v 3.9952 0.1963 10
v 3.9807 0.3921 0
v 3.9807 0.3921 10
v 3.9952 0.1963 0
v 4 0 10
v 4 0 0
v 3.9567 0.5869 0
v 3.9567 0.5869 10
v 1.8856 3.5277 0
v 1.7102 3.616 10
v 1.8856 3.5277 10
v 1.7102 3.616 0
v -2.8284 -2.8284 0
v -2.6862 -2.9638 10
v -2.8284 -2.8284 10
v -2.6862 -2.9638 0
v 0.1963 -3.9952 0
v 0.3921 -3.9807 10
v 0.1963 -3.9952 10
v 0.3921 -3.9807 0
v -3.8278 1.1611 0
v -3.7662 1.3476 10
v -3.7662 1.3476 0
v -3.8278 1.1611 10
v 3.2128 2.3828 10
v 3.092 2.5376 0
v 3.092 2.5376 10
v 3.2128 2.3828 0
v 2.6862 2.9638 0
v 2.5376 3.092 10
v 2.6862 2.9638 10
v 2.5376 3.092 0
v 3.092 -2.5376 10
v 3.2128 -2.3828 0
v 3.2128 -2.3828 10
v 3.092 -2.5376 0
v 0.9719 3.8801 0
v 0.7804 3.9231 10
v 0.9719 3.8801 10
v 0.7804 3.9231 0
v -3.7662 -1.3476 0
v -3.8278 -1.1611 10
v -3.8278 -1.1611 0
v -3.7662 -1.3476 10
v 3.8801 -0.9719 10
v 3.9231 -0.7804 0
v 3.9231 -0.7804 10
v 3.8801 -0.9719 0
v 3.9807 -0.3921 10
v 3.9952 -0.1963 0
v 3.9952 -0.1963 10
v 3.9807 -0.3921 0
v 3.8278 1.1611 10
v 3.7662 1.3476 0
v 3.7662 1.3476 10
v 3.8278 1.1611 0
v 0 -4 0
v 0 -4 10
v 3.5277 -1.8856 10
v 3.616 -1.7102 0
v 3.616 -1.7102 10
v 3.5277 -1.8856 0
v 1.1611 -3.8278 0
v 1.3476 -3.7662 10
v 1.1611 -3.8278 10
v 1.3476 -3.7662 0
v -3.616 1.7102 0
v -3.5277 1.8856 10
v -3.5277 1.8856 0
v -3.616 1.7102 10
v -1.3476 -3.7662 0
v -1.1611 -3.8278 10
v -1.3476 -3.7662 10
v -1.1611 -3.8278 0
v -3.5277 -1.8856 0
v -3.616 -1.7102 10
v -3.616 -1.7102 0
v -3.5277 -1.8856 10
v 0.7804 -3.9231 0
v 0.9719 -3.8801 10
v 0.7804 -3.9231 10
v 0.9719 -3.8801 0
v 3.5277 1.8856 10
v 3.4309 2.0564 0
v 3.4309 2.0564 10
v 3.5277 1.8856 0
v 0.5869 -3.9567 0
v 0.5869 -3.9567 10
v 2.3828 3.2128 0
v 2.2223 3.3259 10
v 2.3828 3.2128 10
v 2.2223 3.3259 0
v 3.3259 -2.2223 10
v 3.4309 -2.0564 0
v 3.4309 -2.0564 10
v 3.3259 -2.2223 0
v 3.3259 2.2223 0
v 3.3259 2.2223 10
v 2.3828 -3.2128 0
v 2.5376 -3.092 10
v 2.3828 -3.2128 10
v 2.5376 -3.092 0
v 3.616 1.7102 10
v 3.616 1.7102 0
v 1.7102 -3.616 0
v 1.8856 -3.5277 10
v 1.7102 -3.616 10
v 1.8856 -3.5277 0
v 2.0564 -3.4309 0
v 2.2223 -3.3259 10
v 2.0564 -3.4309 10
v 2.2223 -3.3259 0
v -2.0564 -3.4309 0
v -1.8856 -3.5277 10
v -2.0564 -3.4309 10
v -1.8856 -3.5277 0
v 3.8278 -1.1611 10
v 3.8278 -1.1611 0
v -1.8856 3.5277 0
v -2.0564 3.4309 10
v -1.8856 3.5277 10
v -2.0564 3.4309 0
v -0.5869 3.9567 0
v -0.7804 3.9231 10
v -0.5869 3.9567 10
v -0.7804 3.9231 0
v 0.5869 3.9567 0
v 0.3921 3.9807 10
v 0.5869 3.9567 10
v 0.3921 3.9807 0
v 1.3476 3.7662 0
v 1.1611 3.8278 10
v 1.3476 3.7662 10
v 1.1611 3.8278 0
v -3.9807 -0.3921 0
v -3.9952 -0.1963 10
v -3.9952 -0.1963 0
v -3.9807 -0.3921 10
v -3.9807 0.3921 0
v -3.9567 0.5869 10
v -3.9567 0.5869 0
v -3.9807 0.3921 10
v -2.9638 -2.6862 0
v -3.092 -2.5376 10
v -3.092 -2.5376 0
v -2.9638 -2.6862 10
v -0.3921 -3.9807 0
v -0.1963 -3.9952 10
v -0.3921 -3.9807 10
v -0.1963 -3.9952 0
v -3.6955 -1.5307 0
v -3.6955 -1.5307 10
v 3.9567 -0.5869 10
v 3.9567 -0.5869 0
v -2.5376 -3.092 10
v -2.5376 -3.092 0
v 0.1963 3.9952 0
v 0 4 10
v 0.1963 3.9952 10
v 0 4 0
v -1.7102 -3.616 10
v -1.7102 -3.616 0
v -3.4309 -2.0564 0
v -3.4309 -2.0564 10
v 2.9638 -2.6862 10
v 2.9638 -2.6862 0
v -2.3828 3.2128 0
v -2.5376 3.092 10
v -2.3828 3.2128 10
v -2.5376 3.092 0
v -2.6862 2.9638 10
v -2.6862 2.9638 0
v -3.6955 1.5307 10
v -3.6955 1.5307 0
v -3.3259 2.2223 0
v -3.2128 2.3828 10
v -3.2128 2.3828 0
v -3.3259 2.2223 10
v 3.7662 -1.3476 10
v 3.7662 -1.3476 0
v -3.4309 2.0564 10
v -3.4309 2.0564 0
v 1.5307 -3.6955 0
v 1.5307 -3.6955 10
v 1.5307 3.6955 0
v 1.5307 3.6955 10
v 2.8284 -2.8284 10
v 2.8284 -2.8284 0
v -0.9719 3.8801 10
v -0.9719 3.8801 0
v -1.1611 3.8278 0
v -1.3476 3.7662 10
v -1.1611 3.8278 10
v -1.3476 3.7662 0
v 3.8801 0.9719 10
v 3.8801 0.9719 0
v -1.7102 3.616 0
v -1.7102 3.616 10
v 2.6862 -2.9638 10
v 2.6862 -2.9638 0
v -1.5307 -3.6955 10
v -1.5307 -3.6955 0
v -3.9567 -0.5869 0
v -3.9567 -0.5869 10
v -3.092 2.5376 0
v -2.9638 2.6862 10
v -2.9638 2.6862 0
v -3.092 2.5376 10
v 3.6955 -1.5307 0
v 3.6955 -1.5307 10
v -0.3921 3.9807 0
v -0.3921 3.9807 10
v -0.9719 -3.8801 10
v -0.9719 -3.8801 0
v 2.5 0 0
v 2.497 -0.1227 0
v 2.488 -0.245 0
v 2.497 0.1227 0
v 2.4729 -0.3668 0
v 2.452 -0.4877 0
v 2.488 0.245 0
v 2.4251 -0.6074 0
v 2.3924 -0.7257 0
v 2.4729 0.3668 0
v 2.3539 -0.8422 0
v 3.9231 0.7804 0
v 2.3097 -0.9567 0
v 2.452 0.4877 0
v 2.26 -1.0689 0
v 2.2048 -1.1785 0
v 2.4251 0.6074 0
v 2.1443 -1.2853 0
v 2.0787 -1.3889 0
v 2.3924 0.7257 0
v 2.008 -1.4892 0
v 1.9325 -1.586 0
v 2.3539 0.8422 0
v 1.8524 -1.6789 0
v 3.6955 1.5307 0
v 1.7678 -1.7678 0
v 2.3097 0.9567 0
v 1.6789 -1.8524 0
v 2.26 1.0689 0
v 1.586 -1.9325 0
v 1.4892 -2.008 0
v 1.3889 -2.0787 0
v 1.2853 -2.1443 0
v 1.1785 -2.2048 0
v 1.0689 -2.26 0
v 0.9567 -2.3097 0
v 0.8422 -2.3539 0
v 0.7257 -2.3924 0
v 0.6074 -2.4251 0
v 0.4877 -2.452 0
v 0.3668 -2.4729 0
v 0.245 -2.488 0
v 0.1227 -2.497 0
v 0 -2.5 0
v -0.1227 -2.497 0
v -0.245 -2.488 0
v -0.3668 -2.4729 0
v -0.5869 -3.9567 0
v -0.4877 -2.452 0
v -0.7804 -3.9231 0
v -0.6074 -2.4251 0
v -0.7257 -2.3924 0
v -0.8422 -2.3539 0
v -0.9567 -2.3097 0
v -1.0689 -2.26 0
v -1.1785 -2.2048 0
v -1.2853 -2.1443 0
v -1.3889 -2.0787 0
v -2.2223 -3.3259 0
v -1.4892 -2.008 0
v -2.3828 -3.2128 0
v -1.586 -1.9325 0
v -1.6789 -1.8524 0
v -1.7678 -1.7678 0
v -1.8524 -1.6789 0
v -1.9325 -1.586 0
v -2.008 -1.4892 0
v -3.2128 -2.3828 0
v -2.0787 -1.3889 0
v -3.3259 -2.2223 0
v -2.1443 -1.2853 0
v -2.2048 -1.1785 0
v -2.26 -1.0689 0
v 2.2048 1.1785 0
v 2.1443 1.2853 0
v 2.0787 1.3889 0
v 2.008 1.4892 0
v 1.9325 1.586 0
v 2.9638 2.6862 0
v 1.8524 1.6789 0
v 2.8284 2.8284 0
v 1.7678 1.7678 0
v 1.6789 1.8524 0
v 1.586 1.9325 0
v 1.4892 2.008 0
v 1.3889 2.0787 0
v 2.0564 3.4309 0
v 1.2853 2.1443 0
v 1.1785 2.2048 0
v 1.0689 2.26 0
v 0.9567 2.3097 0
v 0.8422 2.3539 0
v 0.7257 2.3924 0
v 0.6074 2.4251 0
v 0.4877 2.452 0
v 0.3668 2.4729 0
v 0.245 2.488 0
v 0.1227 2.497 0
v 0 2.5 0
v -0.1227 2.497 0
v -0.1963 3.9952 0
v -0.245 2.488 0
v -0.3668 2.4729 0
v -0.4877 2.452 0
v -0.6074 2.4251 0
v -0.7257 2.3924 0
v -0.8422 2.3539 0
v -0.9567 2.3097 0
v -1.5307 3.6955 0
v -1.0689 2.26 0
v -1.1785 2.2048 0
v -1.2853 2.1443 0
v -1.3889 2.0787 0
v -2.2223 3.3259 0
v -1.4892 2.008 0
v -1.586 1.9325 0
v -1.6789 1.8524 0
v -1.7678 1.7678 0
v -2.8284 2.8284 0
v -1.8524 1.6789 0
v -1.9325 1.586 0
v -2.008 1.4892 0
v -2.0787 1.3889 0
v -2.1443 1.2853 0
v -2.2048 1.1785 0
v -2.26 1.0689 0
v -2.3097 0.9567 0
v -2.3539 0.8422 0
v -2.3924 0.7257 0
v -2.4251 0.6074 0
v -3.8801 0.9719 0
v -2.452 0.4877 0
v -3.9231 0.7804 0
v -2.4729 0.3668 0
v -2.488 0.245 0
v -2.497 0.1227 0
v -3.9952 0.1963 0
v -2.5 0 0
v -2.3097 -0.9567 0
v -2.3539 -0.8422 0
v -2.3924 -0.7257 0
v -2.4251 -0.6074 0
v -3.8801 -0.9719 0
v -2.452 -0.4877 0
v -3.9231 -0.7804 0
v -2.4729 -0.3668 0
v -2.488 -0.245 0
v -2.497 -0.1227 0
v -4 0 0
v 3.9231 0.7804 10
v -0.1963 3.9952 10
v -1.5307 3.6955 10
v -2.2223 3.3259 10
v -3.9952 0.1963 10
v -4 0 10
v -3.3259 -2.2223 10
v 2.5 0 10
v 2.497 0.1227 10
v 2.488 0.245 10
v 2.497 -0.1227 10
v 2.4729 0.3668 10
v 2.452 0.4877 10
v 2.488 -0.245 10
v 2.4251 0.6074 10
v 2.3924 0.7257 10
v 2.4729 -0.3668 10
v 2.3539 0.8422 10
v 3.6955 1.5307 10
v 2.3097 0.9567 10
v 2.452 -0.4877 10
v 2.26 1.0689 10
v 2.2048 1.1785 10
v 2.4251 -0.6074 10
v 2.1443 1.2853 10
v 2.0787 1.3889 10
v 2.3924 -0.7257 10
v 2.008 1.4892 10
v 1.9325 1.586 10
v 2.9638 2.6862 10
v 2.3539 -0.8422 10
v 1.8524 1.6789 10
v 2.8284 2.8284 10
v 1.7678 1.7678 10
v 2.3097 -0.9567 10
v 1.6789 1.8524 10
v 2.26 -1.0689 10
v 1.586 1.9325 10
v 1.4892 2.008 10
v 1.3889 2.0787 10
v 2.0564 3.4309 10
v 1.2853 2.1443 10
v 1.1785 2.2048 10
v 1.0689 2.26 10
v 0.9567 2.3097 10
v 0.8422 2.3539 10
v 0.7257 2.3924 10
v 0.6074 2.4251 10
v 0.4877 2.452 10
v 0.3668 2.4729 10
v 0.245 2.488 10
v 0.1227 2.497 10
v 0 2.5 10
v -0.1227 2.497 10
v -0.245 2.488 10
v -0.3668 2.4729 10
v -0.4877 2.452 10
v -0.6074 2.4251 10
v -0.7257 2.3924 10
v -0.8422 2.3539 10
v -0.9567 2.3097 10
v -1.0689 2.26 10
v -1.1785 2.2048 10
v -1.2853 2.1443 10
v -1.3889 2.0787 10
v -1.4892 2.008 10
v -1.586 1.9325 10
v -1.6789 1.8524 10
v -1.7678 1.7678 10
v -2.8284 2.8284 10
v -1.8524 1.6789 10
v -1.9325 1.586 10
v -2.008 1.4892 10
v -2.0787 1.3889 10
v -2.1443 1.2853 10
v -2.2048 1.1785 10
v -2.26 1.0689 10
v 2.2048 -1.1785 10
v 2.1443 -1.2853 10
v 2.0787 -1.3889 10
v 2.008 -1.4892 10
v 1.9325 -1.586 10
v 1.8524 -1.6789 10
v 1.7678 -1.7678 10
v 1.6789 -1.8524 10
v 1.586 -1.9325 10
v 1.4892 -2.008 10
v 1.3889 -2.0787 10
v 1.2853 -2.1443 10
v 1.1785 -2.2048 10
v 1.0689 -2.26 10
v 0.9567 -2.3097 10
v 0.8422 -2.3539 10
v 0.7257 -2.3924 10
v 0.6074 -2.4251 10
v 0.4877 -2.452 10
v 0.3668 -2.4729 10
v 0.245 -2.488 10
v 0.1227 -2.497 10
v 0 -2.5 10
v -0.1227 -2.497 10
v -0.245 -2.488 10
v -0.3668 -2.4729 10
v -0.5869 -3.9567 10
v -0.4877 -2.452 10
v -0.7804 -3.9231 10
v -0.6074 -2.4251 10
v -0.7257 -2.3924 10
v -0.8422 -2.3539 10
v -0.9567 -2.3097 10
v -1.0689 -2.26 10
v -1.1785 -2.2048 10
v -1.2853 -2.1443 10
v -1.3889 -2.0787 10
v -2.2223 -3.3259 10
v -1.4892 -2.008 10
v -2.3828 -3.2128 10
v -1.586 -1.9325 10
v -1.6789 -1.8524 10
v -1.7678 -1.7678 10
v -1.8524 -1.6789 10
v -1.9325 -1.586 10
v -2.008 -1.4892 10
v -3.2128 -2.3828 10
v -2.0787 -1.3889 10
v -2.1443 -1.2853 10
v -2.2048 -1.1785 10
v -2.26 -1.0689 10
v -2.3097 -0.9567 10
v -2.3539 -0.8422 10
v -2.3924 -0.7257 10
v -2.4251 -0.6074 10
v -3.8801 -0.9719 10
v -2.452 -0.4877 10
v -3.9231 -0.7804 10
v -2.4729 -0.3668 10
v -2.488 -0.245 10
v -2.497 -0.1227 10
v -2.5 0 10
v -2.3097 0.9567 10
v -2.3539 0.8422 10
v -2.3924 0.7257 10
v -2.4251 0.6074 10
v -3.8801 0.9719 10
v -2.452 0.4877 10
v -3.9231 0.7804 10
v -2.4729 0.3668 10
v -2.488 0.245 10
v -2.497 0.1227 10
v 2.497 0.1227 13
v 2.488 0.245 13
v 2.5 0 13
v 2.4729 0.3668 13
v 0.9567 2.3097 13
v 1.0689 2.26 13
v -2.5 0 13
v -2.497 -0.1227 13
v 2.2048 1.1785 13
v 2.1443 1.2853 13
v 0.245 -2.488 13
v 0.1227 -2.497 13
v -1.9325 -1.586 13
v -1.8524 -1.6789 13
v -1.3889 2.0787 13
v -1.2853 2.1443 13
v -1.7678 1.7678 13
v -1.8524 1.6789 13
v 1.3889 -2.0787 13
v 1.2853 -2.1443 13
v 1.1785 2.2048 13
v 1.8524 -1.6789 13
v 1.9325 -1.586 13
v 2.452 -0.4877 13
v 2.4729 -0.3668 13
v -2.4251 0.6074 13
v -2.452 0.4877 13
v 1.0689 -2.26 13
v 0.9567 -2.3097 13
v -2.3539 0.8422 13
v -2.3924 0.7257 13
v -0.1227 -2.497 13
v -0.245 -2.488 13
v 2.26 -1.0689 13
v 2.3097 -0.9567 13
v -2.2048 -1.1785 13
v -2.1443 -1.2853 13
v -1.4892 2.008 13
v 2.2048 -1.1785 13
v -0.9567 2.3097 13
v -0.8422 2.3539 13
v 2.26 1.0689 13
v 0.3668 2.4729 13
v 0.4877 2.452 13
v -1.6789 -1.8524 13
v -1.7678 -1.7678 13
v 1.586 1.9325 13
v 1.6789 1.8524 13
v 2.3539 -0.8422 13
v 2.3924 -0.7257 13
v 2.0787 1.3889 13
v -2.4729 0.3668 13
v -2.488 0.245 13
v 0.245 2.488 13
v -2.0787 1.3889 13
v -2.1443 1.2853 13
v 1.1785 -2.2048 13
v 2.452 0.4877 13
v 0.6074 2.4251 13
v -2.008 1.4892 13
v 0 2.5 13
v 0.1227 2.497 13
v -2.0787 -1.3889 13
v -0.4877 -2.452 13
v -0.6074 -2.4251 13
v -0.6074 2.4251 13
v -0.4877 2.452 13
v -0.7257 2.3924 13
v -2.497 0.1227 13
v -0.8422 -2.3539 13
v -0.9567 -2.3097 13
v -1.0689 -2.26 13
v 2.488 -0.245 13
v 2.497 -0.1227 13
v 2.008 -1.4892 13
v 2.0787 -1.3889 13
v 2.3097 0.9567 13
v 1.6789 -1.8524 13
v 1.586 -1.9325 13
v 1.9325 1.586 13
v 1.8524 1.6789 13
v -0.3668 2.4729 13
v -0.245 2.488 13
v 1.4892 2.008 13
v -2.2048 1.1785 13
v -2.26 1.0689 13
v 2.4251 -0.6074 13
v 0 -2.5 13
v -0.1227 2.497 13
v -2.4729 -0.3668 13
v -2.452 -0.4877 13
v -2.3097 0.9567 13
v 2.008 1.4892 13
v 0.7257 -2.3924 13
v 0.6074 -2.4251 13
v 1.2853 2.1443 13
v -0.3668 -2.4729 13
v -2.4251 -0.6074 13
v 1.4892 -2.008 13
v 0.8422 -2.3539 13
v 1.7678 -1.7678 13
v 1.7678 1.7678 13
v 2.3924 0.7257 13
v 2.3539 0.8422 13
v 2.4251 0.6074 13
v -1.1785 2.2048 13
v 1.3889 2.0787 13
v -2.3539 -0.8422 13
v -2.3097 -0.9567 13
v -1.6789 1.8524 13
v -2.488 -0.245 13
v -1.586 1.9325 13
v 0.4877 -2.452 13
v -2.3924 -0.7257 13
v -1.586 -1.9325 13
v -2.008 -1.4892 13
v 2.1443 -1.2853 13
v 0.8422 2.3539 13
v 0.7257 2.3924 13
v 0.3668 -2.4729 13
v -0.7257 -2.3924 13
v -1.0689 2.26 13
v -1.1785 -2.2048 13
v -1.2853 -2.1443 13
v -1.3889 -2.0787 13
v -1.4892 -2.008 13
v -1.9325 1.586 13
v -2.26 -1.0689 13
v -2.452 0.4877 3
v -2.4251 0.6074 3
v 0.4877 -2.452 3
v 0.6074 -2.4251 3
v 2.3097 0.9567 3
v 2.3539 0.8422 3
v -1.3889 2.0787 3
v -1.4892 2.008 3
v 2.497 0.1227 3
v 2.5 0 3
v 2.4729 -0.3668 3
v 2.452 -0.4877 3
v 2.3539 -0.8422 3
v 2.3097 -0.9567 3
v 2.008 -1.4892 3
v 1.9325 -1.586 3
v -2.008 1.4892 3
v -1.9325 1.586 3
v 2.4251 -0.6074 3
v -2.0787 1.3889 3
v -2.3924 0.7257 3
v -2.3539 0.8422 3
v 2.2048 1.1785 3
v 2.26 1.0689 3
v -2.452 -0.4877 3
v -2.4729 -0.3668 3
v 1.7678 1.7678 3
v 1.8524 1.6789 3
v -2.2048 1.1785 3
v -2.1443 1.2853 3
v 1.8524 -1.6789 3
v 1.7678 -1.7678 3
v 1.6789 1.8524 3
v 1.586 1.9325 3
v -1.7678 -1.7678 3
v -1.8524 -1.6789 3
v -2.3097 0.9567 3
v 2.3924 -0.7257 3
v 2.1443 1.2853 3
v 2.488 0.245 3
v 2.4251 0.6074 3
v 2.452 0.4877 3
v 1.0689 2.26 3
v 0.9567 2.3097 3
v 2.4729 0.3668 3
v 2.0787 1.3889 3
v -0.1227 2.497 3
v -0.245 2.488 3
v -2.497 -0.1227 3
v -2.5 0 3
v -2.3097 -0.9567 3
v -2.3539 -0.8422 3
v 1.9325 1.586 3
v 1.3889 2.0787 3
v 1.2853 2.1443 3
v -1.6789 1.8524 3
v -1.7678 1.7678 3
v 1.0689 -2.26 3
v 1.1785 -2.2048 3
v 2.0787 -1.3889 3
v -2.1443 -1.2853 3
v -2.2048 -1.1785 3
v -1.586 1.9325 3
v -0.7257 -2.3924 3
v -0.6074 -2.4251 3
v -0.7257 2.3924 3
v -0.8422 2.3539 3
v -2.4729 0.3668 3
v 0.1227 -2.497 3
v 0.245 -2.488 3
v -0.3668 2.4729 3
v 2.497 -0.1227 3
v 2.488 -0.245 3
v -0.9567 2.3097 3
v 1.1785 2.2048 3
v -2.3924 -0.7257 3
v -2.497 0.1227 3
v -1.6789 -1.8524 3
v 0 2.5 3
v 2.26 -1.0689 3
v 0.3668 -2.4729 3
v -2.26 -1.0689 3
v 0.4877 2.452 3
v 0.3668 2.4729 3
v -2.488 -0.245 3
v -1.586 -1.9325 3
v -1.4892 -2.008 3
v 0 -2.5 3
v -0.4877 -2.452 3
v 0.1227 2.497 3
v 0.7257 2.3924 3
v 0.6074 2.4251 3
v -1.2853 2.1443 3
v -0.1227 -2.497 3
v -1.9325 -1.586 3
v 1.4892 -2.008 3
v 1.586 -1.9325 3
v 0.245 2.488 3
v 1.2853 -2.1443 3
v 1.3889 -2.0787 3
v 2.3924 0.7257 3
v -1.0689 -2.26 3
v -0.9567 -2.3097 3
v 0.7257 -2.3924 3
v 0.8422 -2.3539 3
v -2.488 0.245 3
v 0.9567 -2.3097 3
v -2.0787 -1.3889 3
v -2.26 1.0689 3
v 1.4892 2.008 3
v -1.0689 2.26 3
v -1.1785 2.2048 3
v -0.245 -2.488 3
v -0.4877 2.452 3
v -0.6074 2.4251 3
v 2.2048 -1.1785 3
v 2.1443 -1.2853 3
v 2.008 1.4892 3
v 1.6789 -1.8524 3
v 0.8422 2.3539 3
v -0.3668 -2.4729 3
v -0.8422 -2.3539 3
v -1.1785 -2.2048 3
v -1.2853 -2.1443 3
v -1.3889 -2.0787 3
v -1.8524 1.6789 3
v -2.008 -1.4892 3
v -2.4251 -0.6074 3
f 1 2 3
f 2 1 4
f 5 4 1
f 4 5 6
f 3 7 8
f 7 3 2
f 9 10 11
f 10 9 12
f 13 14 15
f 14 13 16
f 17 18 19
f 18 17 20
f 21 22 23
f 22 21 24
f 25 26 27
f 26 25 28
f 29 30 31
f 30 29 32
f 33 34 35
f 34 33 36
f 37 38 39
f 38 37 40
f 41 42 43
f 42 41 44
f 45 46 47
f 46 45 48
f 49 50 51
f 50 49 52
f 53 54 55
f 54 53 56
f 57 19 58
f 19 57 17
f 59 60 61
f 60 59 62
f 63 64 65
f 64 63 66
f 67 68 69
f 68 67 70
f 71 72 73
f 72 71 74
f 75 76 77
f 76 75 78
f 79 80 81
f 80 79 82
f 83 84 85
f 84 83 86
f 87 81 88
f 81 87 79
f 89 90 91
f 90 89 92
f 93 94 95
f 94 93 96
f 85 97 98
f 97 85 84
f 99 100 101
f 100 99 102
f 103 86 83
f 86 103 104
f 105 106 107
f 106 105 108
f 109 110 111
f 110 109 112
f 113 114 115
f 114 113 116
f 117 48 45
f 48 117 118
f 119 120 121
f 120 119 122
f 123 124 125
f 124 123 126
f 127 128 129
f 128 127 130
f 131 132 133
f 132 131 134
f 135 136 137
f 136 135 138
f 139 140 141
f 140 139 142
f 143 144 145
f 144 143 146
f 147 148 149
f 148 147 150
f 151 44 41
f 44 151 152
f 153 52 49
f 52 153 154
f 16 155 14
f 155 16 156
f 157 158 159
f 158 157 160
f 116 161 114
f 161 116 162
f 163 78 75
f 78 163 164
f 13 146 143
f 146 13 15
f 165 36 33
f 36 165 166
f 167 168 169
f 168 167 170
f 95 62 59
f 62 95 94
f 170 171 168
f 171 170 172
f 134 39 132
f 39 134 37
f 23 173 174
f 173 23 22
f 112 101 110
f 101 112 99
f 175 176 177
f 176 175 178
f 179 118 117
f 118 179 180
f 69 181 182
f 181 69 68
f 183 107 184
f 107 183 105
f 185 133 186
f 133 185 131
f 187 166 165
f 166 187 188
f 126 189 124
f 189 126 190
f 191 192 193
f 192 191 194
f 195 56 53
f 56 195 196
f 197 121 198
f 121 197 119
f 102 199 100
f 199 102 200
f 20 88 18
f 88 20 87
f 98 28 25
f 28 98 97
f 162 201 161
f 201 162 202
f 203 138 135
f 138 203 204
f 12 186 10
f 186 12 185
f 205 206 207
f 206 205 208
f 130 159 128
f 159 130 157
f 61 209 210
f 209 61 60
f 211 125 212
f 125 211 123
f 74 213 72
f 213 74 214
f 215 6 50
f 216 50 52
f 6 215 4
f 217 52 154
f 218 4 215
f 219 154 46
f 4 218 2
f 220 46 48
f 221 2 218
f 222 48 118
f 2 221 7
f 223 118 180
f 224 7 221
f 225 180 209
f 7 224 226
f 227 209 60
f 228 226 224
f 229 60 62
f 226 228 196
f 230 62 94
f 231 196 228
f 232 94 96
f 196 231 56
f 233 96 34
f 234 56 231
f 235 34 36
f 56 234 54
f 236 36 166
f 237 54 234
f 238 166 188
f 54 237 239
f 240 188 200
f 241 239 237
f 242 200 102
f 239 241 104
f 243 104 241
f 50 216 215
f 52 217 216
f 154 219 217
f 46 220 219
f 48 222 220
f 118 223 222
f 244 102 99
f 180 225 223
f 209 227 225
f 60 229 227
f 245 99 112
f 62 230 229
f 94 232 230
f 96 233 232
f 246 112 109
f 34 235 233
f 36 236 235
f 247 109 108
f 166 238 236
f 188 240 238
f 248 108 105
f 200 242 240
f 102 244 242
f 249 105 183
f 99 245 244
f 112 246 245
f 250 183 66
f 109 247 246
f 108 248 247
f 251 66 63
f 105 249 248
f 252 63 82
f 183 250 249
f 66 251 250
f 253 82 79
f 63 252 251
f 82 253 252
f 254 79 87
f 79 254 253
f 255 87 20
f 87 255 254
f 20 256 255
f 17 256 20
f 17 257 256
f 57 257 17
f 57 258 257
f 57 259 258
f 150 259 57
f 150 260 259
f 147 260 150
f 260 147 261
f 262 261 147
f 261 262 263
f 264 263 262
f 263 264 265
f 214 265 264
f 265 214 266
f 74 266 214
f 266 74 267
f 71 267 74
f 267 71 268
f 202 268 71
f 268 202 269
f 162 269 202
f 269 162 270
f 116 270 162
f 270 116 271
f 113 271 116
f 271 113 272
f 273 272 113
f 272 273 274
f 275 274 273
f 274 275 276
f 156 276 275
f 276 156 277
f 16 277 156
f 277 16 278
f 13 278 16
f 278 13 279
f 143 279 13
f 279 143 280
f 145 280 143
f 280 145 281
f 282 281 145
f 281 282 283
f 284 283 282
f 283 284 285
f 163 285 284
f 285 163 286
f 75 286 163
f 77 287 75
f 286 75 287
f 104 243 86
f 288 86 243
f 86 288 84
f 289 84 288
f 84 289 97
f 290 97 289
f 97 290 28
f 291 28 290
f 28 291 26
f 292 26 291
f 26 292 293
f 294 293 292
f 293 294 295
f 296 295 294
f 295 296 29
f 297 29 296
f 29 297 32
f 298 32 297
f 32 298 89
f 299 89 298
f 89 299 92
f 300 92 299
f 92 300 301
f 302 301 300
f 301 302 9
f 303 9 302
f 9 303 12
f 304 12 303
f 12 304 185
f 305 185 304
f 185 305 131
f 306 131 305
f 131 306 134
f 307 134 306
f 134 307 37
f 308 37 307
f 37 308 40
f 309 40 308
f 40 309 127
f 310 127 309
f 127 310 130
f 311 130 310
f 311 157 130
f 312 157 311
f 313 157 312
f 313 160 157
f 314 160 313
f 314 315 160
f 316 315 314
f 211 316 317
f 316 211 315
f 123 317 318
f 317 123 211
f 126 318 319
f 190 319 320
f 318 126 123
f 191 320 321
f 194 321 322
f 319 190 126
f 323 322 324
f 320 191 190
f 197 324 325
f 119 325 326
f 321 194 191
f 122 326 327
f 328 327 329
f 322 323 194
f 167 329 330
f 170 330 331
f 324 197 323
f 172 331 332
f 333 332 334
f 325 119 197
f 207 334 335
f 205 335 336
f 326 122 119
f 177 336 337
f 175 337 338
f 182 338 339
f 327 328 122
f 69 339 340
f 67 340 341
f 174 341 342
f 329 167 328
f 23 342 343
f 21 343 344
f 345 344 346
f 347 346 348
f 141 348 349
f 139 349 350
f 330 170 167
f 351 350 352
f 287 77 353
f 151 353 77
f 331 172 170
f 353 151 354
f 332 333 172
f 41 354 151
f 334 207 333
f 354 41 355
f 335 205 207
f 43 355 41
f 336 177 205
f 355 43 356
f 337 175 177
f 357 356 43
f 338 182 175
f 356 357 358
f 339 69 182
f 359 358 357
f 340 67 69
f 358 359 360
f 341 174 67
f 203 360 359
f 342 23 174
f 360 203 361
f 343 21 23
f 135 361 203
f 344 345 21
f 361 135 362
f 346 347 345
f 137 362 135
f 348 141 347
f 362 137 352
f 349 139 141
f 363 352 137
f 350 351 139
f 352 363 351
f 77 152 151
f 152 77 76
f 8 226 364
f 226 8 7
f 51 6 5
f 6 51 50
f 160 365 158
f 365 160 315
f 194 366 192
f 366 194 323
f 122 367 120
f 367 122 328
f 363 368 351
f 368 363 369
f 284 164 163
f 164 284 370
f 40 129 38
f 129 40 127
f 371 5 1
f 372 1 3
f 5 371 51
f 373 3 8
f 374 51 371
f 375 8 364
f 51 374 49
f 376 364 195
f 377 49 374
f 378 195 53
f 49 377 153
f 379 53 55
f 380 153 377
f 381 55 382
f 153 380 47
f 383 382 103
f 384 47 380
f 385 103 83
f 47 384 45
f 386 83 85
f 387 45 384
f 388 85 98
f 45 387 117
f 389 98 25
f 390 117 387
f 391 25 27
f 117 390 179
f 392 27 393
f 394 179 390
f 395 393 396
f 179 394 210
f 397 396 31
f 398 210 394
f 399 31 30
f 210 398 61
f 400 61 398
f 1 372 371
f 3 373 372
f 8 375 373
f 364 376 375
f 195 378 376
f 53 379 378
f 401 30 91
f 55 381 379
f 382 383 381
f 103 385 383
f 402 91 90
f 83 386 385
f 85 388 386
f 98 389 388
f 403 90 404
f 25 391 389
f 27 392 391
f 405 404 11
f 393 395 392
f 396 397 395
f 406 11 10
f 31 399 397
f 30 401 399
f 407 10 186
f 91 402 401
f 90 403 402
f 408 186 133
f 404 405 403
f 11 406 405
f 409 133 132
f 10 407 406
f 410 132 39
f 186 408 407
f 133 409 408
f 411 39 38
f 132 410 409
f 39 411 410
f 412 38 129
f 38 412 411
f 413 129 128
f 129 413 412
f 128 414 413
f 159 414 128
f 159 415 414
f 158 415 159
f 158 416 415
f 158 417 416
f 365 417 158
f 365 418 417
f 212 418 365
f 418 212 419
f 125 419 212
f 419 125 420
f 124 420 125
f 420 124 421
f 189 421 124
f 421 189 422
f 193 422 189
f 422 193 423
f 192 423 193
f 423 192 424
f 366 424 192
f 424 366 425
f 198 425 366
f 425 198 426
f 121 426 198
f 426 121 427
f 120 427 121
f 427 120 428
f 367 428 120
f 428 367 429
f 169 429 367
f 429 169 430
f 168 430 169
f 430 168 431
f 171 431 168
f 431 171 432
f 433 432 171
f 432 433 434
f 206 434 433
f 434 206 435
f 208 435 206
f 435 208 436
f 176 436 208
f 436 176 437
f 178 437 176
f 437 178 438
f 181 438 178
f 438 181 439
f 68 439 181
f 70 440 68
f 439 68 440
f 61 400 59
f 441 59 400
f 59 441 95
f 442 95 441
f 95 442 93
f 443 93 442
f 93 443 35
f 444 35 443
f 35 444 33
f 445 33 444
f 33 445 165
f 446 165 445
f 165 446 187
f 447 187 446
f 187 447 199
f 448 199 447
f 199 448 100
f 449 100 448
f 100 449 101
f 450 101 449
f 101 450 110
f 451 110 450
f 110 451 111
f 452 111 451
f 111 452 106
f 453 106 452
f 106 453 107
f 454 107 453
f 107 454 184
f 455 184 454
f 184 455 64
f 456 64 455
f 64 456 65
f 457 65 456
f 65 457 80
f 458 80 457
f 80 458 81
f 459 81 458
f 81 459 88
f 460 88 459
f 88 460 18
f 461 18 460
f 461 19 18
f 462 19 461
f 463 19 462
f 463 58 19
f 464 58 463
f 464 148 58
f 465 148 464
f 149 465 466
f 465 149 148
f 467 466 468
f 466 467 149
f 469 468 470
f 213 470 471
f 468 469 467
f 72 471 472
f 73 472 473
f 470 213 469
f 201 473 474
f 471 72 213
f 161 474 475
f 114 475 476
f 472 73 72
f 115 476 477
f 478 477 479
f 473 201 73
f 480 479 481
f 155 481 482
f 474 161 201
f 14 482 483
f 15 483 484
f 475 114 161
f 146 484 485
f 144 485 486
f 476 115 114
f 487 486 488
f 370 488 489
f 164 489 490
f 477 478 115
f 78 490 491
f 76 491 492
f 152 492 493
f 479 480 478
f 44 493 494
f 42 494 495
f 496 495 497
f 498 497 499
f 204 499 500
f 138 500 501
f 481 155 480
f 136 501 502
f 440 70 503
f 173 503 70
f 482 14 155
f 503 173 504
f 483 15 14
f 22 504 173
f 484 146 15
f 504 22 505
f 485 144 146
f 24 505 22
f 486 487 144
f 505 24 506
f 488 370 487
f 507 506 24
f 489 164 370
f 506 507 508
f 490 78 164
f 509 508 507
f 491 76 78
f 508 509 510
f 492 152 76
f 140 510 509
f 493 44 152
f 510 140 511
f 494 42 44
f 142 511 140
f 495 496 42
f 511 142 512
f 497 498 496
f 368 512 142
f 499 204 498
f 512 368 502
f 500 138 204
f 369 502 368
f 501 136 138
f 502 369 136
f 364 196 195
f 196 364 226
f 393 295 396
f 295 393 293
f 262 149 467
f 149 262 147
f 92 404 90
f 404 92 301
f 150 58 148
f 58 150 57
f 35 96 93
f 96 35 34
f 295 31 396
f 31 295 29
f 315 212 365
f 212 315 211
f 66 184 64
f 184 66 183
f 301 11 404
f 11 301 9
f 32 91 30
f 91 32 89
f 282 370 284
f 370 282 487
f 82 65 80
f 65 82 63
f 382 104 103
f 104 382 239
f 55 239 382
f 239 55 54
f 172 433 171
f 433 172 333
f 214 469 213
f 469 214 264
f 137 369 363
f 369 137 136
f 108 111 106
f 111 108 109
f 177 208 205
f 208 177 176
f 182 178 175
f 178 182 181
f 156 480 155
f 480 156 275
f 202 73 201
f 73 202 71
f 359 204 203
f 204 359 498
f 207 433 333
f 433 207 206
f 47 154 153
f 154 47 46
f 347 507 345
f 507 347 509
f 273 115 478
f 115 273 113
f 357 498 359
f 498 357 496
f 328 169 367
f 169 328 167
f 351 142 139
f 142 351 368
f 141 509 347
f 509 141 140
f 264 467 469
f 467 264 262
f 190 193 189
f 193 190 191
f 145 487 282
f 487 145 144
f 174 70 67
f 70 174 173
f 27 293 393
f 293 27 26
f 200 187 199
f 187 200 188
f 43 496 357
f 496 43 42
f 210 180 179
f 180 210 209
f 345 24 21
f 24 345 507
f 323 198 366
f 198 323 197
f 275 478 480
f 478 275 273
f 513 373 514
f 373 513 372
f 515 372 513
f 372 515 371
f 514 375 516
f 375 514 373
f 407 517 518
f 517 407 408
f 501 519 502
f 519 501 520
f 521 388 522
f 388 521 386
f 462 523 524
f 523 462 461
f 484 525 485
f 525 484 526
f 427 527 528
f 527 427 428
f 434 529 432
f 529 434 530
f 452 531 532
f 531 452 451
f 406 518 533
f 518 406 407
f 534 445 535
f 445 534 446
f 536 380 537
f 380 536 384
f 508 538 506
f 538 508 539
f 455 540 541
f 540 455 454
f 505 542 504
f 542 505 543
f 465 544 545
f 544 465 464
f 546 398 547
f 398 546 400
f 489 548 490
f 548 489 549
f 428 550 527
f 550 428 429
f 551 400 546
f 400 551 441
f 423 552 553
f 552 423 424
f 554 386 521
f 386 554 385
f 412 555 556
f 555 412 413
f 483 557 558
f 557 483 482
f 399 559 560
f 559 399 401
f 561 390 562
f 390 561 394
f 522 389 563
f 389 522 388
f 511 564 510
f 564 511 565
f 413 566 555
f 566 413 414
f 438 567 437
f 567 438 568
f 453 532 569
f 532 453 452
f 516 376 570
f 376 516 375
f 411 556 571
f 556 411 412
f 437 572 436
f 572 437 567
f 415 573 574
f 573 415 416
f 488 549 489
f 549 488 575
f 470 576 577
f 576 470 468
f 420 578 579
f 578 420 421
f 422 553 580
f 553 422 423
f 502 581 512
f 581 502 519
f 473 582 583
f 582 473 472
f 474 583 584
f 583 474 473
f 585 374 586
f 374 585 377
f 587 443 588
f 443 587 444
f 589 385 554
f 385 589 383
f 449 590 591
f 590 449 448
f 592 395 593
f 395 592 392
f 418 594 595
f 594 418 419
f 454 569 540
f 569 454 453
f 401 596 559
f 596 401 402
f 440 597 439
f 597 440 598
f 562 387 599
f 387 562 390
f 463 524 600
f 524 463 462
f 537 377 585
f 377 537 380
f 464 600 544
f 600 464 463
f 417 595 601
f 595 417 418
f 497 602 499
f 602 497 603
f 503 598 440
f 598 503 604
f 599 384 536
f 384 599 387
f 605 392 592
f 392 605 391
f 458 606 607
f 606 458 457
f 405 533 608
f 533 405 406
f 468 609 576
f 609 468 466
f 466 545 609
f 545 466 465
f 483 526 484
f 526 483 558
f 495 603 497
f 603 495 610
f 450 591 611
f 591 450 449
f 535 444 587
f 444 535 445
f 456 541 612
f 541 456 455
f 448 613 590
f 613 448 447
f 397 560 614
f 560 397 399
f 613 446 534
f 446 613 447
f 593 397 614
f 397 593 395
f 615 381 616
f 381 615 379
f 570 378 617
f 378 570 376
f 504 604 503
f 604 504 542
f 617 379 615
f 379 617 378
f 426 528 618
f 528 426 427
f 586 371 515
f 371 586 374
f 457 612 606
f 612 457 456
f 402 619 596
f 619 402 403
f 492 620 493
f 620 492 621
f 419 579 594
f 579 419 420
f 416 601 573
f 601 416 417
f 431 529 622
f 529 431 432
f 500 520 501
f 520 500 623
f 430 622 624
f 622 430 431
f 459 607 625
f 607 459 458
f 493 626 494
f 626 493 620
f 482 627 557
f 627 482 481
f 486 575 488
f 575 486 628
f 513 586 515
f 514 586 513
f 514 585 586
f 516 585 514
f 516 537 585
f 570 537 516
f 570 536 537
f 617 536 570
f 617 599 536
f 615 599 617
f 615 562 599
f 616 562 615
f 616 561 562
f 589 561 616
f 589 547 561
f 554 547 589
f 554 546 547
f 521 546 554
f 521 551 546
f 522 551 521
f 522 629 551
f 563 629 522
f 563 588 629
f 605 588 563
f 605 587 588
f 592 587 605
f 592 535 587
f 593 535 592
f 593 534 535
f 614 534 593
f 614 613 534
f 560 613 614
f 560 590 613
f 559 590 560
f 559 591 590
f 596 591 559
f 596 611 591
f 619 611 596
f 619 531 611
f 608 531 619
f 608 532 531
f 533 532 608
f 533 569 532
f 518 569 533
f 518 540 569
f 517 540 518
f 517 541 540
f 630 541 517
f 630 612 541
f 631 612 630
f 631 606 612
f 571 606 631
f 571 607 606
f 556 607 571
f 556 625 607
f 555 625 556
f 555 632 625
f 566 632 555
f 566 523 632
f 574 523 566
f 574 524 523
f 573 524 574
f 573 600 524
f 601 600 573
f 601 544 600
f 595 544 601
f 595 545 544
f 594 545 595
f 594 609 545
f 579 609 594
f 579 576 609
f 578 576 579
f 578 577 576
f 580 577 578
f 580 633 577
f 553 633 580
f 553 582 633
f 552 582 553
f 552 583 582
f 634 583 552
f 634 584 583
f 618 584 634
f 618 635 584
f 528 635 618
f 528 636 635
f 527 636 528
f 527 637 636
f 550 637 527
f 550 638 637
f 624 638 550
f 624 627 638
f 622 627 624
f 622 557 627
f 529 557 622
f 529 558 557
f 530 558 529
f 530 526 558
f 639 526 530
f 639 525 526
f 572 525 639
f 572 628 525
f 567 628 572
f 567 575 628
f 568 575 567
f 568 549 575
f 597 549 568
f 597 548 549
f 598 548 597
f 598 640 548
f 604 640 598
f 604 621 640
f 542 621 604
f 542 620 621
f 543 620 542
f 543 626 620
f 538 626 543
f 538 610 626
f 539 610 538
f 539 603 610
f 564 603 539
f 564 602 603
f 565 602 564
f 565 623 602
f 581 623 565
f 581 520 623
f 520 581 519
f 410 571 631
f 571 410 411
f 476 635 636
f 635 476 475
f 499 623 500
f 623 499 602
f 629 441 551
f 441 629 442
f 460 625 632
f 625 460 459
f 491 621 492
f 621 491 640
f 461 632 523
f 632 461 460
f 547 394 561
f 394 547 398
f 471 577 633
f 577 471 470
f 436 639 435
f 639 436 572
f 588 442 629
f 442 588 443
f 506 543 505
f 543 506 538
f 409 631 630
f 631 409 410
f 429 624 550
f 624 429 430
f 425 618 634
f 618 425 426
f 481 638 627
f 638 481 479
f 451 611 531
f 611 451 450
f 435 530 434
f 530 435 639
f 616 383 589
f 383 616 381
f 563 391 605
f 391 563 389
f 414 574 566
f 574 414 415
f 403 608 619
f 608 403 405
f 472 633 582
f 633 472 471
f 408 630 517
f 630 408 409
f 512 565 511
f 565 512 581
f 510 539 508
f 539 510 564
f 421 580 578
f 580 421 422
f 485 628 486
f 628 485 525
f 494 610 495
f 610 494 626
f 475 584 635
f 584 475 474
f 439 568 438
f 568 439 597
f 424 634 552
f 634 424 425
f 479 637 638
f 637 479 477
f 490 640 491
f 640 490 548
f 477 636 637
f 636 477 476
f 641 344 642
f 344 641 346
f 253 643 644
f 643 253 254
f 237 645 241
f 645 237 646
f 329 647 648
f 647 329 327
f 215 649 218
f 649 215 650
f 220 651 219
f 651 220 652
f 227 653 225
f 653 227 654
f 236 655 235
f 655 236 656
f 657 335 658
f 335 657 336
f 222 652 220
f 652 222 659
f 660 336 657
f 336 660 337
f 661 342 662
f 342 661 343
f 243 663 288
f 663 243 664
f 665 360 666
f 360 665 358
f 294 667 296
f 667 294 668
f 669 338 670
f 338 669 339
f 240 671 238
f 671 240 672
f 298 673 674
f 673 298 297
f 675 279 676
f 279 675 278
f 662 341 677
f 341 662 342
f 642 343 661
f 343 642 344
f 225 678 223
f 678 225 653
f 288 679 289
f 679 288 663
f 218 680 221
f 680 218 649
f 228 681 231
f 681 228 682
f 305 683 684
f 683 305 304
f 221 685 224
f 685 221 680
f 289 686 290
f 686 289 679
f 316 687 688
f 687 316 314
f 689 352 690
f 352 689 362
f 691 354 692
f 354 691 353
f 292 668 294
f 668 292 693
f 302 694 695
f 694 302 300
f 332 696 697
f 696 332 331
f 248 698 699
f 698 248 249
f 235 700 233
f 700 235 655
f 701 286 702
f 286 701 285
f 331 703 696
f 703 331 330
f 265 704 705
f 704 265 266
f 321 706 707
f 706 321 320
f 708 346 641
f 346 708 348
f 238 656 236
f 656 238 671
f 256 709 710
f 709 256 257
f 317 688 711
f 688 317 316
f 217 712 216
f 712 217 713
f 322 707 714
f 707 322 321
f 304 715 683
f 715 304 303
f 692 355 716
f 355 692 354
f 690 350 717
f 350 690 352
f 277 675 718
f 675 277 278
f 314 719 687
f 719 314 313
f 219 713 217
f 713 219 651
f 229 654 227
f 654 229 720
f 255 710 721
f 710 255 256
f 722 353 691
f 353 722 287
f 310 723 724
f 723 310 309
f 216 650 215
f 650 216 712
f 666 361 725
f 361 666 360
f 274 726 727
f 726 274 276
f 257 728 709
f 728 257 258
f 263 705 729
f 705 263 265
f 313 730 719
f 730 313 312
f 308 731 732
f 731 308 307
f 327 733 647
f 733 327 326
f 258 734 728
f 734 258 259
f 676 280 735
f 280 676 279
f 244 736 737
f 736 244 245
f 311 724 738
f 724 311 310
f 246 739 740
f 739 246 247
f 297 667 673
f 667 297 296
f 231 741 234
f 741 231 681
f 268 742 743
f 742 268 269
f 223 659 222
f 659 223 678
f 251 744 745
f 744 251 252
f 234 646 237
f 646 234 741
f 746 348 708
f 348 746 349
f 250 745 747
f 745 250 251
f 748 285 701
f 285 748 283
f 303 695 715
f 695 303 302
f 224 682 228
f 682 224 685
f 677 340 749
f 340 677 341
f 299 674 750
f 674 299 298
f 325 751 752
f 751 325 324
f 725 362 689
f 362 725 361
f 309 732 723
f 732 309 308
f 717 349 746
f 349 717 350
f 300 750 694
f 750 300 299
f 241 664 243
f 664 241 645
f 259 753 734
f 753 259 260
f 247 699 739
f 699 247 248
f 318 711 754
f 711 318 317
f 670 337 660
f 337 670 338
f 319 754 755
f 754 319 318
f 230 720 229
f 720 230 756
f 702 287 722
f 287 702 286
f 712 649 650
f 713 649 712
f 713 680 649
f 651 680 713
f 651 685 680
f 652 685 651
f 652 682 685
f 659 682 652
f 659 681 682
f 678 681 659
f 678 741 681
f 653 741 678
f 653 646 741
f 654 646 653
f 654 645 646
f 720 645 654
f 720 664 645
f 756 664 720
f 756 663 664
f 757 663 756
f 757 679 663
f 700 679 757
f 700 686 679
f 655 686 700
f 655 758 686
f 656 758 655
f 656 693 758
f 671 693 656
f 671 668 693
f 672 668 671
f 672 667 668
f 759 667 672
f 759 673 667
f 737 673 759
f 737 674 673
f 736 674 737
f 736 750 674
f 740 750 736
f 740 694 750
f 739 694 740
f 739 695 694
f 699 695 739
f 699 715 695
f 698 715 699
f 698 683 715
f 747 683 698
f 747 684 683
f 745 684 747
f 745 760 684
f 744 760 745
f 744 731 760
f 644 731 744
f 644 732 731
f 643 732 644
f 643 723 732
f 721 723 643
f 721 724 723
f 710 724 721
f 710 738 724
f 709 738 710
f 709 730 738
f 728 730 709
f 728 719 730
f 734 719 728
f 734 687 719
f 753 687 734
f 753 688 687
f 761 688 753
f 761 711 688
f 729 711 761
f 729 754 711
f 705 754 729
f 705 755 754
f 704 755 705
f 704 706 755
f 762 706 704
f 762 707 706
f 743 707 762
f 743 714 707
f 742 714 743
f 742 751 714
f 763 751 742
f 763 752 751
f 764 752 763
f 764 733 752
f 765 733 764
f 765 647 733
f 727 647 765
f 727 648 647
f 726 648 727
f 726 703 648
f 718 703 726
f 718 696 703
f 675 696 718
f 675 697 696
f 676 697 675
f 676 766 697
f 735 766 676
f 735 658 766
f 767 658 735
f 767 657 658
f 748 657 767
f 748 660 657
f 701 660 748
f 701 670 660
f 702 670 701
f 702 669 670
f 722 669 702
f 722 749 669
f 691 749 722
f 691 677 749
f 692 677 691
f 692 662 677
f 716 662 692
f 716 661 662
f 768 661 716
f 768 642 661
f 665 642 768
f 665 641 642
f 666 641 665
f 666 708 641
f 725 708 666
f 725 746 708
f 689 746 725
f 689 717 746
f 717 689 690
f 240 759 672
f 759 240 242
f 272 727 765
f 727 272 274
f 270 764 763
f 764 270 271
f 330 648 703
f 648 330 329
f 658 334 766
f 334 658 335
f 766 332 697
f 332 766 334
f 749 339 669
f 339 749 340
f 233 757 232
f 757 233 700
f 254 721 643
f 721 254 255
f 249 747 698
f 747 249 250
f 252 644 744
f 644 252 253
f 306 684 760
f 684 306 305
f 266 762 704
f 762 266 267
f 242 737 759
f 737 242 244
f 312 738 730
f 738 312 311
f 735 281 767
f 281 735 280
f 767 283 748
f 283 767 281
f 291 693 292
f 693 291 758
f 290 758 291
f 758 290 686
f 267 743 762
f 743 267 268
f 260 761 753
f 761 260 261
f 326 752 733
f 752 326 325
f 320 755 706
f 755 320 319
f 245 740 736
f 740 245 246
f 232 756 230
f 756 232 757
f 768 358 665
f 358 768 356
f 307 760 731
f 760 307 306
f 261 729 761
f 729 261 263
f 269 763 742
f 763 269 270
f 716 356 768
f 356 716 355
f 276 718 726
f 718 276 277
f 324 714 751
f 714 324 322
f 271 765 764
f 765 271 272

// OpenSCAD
// Units: mm. Round fit prototype, NOT a model of the SG90 spline teeth.
// The male projection of 3 mm is assumed to match the requested socket depth.
$fn=128;
body_length=10;
body_diameter=8;
male_diameter=5;
male_length=3;
female_diameter=5;
female_depth=3;
difference() {
    union() {
        cylinder(h=body_length,d=body_diameter);
        translate([0,0,body_length]) cylinder(h=male_length,d=male_diameter);
    }
    translate([0,0,-0.01]) cylinder(h=female_depth+0.01,d=female_diameter);
}
